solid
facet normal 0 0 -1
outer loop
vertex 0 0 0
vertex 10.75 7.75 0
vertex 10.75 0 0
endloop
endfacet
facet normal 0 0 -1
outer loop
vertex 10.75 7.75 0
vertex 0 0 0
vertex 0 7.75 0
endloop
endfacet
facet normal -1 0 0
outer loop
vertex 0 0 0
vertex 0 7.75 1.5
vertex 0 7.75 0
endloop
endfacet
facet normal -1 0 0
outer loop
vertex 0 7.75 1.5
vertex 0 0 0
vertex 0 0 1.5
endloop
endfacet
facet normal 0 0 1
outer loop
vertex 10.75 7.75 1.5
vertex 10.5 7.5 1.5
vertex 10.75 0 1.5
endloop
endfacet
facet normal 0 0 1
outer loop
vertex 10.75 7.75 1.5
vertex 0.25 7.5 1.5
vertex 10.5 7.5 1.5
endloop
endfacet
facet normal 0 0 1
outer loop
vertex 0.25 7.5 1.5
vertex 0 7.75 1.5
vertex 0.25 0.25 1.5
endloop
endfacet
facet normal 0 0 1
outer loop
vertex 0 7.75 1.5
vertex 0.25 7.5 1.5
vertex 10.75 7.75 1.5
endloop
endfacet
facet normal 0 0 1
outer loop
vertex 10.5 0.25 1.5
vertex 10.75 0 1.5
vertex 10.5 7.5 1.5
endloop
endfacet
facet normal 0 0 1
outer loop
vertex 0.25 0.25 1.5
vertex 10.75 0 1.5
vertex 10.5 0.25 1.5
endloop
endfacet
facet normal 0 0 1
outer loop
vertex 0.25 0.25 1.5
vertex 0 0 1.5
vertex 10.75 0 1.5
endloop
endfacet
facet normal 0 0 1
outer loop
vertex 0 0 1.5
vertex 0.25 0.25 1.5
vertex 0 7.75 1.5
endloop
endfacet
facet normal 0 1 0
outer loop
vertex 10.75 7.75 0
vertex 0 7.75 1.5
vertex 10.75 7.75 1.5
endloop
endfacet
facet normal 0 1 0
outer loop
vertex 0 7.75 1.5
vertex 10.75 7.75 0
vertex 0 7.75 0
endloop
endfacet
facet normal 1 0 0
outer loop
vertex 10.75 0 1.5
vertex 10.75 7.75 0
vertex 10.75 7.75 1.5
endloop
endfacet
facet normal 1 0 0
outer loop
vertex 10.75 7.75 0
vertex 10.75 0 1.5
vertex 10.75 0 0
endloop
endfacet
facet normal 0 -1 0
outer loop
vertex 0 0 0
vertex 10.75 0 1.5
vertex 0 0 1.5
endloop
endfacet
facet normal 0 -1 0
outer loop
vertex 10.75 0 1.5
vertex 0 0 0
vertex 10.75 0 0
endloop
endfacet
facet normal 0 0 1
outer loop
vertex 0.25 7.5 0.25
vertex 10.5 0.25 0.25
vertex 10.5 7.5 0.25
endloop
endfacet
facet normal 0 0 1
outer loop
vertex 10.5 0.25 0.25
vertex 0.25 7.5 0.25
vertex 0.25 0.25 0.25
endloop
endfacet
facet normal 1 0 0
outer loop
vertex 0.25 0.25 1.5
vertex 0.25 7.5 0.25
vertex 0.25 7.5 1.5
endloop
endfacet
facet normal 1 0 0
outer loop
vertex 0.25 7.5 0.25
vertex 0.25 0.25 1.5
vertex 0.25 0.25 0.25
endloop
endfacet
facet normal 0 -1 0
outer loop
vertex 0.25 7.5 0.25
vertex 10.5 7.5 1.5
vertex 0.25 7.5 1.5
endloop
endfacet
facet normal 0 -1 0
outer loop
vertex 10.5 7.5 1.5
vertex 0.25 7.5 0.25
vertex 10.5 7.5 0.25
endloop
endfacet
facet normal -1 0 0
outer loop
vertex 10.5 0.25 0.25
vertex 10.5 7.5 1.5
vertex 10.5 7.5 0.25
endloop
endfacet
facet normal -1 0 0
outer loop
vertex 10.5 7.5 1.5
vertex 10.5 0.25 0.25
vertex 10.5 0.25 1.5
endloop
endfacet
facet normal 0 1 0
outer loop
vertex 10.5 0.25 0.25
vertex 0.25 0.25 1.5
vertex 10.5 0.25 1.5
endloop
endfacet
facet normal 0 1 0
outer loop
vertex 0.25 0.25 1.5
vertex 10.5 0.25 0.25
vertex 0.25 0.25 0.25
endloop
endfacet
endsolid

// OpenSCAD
bat_w = 10.25; //inches
bat_depth = 7.25; //inches
tray_height = 1.5; //inches
difference()
{color("blue") linear_extrude(height=tray_height) square([bat_w + .5,bat_depth +.5],center=false);
    //removing center
    translate([0.25,0.250,.25]) color("red") linear_extrude(height=tray_height) square([bat_w ,bat_depth ],center=false);}
